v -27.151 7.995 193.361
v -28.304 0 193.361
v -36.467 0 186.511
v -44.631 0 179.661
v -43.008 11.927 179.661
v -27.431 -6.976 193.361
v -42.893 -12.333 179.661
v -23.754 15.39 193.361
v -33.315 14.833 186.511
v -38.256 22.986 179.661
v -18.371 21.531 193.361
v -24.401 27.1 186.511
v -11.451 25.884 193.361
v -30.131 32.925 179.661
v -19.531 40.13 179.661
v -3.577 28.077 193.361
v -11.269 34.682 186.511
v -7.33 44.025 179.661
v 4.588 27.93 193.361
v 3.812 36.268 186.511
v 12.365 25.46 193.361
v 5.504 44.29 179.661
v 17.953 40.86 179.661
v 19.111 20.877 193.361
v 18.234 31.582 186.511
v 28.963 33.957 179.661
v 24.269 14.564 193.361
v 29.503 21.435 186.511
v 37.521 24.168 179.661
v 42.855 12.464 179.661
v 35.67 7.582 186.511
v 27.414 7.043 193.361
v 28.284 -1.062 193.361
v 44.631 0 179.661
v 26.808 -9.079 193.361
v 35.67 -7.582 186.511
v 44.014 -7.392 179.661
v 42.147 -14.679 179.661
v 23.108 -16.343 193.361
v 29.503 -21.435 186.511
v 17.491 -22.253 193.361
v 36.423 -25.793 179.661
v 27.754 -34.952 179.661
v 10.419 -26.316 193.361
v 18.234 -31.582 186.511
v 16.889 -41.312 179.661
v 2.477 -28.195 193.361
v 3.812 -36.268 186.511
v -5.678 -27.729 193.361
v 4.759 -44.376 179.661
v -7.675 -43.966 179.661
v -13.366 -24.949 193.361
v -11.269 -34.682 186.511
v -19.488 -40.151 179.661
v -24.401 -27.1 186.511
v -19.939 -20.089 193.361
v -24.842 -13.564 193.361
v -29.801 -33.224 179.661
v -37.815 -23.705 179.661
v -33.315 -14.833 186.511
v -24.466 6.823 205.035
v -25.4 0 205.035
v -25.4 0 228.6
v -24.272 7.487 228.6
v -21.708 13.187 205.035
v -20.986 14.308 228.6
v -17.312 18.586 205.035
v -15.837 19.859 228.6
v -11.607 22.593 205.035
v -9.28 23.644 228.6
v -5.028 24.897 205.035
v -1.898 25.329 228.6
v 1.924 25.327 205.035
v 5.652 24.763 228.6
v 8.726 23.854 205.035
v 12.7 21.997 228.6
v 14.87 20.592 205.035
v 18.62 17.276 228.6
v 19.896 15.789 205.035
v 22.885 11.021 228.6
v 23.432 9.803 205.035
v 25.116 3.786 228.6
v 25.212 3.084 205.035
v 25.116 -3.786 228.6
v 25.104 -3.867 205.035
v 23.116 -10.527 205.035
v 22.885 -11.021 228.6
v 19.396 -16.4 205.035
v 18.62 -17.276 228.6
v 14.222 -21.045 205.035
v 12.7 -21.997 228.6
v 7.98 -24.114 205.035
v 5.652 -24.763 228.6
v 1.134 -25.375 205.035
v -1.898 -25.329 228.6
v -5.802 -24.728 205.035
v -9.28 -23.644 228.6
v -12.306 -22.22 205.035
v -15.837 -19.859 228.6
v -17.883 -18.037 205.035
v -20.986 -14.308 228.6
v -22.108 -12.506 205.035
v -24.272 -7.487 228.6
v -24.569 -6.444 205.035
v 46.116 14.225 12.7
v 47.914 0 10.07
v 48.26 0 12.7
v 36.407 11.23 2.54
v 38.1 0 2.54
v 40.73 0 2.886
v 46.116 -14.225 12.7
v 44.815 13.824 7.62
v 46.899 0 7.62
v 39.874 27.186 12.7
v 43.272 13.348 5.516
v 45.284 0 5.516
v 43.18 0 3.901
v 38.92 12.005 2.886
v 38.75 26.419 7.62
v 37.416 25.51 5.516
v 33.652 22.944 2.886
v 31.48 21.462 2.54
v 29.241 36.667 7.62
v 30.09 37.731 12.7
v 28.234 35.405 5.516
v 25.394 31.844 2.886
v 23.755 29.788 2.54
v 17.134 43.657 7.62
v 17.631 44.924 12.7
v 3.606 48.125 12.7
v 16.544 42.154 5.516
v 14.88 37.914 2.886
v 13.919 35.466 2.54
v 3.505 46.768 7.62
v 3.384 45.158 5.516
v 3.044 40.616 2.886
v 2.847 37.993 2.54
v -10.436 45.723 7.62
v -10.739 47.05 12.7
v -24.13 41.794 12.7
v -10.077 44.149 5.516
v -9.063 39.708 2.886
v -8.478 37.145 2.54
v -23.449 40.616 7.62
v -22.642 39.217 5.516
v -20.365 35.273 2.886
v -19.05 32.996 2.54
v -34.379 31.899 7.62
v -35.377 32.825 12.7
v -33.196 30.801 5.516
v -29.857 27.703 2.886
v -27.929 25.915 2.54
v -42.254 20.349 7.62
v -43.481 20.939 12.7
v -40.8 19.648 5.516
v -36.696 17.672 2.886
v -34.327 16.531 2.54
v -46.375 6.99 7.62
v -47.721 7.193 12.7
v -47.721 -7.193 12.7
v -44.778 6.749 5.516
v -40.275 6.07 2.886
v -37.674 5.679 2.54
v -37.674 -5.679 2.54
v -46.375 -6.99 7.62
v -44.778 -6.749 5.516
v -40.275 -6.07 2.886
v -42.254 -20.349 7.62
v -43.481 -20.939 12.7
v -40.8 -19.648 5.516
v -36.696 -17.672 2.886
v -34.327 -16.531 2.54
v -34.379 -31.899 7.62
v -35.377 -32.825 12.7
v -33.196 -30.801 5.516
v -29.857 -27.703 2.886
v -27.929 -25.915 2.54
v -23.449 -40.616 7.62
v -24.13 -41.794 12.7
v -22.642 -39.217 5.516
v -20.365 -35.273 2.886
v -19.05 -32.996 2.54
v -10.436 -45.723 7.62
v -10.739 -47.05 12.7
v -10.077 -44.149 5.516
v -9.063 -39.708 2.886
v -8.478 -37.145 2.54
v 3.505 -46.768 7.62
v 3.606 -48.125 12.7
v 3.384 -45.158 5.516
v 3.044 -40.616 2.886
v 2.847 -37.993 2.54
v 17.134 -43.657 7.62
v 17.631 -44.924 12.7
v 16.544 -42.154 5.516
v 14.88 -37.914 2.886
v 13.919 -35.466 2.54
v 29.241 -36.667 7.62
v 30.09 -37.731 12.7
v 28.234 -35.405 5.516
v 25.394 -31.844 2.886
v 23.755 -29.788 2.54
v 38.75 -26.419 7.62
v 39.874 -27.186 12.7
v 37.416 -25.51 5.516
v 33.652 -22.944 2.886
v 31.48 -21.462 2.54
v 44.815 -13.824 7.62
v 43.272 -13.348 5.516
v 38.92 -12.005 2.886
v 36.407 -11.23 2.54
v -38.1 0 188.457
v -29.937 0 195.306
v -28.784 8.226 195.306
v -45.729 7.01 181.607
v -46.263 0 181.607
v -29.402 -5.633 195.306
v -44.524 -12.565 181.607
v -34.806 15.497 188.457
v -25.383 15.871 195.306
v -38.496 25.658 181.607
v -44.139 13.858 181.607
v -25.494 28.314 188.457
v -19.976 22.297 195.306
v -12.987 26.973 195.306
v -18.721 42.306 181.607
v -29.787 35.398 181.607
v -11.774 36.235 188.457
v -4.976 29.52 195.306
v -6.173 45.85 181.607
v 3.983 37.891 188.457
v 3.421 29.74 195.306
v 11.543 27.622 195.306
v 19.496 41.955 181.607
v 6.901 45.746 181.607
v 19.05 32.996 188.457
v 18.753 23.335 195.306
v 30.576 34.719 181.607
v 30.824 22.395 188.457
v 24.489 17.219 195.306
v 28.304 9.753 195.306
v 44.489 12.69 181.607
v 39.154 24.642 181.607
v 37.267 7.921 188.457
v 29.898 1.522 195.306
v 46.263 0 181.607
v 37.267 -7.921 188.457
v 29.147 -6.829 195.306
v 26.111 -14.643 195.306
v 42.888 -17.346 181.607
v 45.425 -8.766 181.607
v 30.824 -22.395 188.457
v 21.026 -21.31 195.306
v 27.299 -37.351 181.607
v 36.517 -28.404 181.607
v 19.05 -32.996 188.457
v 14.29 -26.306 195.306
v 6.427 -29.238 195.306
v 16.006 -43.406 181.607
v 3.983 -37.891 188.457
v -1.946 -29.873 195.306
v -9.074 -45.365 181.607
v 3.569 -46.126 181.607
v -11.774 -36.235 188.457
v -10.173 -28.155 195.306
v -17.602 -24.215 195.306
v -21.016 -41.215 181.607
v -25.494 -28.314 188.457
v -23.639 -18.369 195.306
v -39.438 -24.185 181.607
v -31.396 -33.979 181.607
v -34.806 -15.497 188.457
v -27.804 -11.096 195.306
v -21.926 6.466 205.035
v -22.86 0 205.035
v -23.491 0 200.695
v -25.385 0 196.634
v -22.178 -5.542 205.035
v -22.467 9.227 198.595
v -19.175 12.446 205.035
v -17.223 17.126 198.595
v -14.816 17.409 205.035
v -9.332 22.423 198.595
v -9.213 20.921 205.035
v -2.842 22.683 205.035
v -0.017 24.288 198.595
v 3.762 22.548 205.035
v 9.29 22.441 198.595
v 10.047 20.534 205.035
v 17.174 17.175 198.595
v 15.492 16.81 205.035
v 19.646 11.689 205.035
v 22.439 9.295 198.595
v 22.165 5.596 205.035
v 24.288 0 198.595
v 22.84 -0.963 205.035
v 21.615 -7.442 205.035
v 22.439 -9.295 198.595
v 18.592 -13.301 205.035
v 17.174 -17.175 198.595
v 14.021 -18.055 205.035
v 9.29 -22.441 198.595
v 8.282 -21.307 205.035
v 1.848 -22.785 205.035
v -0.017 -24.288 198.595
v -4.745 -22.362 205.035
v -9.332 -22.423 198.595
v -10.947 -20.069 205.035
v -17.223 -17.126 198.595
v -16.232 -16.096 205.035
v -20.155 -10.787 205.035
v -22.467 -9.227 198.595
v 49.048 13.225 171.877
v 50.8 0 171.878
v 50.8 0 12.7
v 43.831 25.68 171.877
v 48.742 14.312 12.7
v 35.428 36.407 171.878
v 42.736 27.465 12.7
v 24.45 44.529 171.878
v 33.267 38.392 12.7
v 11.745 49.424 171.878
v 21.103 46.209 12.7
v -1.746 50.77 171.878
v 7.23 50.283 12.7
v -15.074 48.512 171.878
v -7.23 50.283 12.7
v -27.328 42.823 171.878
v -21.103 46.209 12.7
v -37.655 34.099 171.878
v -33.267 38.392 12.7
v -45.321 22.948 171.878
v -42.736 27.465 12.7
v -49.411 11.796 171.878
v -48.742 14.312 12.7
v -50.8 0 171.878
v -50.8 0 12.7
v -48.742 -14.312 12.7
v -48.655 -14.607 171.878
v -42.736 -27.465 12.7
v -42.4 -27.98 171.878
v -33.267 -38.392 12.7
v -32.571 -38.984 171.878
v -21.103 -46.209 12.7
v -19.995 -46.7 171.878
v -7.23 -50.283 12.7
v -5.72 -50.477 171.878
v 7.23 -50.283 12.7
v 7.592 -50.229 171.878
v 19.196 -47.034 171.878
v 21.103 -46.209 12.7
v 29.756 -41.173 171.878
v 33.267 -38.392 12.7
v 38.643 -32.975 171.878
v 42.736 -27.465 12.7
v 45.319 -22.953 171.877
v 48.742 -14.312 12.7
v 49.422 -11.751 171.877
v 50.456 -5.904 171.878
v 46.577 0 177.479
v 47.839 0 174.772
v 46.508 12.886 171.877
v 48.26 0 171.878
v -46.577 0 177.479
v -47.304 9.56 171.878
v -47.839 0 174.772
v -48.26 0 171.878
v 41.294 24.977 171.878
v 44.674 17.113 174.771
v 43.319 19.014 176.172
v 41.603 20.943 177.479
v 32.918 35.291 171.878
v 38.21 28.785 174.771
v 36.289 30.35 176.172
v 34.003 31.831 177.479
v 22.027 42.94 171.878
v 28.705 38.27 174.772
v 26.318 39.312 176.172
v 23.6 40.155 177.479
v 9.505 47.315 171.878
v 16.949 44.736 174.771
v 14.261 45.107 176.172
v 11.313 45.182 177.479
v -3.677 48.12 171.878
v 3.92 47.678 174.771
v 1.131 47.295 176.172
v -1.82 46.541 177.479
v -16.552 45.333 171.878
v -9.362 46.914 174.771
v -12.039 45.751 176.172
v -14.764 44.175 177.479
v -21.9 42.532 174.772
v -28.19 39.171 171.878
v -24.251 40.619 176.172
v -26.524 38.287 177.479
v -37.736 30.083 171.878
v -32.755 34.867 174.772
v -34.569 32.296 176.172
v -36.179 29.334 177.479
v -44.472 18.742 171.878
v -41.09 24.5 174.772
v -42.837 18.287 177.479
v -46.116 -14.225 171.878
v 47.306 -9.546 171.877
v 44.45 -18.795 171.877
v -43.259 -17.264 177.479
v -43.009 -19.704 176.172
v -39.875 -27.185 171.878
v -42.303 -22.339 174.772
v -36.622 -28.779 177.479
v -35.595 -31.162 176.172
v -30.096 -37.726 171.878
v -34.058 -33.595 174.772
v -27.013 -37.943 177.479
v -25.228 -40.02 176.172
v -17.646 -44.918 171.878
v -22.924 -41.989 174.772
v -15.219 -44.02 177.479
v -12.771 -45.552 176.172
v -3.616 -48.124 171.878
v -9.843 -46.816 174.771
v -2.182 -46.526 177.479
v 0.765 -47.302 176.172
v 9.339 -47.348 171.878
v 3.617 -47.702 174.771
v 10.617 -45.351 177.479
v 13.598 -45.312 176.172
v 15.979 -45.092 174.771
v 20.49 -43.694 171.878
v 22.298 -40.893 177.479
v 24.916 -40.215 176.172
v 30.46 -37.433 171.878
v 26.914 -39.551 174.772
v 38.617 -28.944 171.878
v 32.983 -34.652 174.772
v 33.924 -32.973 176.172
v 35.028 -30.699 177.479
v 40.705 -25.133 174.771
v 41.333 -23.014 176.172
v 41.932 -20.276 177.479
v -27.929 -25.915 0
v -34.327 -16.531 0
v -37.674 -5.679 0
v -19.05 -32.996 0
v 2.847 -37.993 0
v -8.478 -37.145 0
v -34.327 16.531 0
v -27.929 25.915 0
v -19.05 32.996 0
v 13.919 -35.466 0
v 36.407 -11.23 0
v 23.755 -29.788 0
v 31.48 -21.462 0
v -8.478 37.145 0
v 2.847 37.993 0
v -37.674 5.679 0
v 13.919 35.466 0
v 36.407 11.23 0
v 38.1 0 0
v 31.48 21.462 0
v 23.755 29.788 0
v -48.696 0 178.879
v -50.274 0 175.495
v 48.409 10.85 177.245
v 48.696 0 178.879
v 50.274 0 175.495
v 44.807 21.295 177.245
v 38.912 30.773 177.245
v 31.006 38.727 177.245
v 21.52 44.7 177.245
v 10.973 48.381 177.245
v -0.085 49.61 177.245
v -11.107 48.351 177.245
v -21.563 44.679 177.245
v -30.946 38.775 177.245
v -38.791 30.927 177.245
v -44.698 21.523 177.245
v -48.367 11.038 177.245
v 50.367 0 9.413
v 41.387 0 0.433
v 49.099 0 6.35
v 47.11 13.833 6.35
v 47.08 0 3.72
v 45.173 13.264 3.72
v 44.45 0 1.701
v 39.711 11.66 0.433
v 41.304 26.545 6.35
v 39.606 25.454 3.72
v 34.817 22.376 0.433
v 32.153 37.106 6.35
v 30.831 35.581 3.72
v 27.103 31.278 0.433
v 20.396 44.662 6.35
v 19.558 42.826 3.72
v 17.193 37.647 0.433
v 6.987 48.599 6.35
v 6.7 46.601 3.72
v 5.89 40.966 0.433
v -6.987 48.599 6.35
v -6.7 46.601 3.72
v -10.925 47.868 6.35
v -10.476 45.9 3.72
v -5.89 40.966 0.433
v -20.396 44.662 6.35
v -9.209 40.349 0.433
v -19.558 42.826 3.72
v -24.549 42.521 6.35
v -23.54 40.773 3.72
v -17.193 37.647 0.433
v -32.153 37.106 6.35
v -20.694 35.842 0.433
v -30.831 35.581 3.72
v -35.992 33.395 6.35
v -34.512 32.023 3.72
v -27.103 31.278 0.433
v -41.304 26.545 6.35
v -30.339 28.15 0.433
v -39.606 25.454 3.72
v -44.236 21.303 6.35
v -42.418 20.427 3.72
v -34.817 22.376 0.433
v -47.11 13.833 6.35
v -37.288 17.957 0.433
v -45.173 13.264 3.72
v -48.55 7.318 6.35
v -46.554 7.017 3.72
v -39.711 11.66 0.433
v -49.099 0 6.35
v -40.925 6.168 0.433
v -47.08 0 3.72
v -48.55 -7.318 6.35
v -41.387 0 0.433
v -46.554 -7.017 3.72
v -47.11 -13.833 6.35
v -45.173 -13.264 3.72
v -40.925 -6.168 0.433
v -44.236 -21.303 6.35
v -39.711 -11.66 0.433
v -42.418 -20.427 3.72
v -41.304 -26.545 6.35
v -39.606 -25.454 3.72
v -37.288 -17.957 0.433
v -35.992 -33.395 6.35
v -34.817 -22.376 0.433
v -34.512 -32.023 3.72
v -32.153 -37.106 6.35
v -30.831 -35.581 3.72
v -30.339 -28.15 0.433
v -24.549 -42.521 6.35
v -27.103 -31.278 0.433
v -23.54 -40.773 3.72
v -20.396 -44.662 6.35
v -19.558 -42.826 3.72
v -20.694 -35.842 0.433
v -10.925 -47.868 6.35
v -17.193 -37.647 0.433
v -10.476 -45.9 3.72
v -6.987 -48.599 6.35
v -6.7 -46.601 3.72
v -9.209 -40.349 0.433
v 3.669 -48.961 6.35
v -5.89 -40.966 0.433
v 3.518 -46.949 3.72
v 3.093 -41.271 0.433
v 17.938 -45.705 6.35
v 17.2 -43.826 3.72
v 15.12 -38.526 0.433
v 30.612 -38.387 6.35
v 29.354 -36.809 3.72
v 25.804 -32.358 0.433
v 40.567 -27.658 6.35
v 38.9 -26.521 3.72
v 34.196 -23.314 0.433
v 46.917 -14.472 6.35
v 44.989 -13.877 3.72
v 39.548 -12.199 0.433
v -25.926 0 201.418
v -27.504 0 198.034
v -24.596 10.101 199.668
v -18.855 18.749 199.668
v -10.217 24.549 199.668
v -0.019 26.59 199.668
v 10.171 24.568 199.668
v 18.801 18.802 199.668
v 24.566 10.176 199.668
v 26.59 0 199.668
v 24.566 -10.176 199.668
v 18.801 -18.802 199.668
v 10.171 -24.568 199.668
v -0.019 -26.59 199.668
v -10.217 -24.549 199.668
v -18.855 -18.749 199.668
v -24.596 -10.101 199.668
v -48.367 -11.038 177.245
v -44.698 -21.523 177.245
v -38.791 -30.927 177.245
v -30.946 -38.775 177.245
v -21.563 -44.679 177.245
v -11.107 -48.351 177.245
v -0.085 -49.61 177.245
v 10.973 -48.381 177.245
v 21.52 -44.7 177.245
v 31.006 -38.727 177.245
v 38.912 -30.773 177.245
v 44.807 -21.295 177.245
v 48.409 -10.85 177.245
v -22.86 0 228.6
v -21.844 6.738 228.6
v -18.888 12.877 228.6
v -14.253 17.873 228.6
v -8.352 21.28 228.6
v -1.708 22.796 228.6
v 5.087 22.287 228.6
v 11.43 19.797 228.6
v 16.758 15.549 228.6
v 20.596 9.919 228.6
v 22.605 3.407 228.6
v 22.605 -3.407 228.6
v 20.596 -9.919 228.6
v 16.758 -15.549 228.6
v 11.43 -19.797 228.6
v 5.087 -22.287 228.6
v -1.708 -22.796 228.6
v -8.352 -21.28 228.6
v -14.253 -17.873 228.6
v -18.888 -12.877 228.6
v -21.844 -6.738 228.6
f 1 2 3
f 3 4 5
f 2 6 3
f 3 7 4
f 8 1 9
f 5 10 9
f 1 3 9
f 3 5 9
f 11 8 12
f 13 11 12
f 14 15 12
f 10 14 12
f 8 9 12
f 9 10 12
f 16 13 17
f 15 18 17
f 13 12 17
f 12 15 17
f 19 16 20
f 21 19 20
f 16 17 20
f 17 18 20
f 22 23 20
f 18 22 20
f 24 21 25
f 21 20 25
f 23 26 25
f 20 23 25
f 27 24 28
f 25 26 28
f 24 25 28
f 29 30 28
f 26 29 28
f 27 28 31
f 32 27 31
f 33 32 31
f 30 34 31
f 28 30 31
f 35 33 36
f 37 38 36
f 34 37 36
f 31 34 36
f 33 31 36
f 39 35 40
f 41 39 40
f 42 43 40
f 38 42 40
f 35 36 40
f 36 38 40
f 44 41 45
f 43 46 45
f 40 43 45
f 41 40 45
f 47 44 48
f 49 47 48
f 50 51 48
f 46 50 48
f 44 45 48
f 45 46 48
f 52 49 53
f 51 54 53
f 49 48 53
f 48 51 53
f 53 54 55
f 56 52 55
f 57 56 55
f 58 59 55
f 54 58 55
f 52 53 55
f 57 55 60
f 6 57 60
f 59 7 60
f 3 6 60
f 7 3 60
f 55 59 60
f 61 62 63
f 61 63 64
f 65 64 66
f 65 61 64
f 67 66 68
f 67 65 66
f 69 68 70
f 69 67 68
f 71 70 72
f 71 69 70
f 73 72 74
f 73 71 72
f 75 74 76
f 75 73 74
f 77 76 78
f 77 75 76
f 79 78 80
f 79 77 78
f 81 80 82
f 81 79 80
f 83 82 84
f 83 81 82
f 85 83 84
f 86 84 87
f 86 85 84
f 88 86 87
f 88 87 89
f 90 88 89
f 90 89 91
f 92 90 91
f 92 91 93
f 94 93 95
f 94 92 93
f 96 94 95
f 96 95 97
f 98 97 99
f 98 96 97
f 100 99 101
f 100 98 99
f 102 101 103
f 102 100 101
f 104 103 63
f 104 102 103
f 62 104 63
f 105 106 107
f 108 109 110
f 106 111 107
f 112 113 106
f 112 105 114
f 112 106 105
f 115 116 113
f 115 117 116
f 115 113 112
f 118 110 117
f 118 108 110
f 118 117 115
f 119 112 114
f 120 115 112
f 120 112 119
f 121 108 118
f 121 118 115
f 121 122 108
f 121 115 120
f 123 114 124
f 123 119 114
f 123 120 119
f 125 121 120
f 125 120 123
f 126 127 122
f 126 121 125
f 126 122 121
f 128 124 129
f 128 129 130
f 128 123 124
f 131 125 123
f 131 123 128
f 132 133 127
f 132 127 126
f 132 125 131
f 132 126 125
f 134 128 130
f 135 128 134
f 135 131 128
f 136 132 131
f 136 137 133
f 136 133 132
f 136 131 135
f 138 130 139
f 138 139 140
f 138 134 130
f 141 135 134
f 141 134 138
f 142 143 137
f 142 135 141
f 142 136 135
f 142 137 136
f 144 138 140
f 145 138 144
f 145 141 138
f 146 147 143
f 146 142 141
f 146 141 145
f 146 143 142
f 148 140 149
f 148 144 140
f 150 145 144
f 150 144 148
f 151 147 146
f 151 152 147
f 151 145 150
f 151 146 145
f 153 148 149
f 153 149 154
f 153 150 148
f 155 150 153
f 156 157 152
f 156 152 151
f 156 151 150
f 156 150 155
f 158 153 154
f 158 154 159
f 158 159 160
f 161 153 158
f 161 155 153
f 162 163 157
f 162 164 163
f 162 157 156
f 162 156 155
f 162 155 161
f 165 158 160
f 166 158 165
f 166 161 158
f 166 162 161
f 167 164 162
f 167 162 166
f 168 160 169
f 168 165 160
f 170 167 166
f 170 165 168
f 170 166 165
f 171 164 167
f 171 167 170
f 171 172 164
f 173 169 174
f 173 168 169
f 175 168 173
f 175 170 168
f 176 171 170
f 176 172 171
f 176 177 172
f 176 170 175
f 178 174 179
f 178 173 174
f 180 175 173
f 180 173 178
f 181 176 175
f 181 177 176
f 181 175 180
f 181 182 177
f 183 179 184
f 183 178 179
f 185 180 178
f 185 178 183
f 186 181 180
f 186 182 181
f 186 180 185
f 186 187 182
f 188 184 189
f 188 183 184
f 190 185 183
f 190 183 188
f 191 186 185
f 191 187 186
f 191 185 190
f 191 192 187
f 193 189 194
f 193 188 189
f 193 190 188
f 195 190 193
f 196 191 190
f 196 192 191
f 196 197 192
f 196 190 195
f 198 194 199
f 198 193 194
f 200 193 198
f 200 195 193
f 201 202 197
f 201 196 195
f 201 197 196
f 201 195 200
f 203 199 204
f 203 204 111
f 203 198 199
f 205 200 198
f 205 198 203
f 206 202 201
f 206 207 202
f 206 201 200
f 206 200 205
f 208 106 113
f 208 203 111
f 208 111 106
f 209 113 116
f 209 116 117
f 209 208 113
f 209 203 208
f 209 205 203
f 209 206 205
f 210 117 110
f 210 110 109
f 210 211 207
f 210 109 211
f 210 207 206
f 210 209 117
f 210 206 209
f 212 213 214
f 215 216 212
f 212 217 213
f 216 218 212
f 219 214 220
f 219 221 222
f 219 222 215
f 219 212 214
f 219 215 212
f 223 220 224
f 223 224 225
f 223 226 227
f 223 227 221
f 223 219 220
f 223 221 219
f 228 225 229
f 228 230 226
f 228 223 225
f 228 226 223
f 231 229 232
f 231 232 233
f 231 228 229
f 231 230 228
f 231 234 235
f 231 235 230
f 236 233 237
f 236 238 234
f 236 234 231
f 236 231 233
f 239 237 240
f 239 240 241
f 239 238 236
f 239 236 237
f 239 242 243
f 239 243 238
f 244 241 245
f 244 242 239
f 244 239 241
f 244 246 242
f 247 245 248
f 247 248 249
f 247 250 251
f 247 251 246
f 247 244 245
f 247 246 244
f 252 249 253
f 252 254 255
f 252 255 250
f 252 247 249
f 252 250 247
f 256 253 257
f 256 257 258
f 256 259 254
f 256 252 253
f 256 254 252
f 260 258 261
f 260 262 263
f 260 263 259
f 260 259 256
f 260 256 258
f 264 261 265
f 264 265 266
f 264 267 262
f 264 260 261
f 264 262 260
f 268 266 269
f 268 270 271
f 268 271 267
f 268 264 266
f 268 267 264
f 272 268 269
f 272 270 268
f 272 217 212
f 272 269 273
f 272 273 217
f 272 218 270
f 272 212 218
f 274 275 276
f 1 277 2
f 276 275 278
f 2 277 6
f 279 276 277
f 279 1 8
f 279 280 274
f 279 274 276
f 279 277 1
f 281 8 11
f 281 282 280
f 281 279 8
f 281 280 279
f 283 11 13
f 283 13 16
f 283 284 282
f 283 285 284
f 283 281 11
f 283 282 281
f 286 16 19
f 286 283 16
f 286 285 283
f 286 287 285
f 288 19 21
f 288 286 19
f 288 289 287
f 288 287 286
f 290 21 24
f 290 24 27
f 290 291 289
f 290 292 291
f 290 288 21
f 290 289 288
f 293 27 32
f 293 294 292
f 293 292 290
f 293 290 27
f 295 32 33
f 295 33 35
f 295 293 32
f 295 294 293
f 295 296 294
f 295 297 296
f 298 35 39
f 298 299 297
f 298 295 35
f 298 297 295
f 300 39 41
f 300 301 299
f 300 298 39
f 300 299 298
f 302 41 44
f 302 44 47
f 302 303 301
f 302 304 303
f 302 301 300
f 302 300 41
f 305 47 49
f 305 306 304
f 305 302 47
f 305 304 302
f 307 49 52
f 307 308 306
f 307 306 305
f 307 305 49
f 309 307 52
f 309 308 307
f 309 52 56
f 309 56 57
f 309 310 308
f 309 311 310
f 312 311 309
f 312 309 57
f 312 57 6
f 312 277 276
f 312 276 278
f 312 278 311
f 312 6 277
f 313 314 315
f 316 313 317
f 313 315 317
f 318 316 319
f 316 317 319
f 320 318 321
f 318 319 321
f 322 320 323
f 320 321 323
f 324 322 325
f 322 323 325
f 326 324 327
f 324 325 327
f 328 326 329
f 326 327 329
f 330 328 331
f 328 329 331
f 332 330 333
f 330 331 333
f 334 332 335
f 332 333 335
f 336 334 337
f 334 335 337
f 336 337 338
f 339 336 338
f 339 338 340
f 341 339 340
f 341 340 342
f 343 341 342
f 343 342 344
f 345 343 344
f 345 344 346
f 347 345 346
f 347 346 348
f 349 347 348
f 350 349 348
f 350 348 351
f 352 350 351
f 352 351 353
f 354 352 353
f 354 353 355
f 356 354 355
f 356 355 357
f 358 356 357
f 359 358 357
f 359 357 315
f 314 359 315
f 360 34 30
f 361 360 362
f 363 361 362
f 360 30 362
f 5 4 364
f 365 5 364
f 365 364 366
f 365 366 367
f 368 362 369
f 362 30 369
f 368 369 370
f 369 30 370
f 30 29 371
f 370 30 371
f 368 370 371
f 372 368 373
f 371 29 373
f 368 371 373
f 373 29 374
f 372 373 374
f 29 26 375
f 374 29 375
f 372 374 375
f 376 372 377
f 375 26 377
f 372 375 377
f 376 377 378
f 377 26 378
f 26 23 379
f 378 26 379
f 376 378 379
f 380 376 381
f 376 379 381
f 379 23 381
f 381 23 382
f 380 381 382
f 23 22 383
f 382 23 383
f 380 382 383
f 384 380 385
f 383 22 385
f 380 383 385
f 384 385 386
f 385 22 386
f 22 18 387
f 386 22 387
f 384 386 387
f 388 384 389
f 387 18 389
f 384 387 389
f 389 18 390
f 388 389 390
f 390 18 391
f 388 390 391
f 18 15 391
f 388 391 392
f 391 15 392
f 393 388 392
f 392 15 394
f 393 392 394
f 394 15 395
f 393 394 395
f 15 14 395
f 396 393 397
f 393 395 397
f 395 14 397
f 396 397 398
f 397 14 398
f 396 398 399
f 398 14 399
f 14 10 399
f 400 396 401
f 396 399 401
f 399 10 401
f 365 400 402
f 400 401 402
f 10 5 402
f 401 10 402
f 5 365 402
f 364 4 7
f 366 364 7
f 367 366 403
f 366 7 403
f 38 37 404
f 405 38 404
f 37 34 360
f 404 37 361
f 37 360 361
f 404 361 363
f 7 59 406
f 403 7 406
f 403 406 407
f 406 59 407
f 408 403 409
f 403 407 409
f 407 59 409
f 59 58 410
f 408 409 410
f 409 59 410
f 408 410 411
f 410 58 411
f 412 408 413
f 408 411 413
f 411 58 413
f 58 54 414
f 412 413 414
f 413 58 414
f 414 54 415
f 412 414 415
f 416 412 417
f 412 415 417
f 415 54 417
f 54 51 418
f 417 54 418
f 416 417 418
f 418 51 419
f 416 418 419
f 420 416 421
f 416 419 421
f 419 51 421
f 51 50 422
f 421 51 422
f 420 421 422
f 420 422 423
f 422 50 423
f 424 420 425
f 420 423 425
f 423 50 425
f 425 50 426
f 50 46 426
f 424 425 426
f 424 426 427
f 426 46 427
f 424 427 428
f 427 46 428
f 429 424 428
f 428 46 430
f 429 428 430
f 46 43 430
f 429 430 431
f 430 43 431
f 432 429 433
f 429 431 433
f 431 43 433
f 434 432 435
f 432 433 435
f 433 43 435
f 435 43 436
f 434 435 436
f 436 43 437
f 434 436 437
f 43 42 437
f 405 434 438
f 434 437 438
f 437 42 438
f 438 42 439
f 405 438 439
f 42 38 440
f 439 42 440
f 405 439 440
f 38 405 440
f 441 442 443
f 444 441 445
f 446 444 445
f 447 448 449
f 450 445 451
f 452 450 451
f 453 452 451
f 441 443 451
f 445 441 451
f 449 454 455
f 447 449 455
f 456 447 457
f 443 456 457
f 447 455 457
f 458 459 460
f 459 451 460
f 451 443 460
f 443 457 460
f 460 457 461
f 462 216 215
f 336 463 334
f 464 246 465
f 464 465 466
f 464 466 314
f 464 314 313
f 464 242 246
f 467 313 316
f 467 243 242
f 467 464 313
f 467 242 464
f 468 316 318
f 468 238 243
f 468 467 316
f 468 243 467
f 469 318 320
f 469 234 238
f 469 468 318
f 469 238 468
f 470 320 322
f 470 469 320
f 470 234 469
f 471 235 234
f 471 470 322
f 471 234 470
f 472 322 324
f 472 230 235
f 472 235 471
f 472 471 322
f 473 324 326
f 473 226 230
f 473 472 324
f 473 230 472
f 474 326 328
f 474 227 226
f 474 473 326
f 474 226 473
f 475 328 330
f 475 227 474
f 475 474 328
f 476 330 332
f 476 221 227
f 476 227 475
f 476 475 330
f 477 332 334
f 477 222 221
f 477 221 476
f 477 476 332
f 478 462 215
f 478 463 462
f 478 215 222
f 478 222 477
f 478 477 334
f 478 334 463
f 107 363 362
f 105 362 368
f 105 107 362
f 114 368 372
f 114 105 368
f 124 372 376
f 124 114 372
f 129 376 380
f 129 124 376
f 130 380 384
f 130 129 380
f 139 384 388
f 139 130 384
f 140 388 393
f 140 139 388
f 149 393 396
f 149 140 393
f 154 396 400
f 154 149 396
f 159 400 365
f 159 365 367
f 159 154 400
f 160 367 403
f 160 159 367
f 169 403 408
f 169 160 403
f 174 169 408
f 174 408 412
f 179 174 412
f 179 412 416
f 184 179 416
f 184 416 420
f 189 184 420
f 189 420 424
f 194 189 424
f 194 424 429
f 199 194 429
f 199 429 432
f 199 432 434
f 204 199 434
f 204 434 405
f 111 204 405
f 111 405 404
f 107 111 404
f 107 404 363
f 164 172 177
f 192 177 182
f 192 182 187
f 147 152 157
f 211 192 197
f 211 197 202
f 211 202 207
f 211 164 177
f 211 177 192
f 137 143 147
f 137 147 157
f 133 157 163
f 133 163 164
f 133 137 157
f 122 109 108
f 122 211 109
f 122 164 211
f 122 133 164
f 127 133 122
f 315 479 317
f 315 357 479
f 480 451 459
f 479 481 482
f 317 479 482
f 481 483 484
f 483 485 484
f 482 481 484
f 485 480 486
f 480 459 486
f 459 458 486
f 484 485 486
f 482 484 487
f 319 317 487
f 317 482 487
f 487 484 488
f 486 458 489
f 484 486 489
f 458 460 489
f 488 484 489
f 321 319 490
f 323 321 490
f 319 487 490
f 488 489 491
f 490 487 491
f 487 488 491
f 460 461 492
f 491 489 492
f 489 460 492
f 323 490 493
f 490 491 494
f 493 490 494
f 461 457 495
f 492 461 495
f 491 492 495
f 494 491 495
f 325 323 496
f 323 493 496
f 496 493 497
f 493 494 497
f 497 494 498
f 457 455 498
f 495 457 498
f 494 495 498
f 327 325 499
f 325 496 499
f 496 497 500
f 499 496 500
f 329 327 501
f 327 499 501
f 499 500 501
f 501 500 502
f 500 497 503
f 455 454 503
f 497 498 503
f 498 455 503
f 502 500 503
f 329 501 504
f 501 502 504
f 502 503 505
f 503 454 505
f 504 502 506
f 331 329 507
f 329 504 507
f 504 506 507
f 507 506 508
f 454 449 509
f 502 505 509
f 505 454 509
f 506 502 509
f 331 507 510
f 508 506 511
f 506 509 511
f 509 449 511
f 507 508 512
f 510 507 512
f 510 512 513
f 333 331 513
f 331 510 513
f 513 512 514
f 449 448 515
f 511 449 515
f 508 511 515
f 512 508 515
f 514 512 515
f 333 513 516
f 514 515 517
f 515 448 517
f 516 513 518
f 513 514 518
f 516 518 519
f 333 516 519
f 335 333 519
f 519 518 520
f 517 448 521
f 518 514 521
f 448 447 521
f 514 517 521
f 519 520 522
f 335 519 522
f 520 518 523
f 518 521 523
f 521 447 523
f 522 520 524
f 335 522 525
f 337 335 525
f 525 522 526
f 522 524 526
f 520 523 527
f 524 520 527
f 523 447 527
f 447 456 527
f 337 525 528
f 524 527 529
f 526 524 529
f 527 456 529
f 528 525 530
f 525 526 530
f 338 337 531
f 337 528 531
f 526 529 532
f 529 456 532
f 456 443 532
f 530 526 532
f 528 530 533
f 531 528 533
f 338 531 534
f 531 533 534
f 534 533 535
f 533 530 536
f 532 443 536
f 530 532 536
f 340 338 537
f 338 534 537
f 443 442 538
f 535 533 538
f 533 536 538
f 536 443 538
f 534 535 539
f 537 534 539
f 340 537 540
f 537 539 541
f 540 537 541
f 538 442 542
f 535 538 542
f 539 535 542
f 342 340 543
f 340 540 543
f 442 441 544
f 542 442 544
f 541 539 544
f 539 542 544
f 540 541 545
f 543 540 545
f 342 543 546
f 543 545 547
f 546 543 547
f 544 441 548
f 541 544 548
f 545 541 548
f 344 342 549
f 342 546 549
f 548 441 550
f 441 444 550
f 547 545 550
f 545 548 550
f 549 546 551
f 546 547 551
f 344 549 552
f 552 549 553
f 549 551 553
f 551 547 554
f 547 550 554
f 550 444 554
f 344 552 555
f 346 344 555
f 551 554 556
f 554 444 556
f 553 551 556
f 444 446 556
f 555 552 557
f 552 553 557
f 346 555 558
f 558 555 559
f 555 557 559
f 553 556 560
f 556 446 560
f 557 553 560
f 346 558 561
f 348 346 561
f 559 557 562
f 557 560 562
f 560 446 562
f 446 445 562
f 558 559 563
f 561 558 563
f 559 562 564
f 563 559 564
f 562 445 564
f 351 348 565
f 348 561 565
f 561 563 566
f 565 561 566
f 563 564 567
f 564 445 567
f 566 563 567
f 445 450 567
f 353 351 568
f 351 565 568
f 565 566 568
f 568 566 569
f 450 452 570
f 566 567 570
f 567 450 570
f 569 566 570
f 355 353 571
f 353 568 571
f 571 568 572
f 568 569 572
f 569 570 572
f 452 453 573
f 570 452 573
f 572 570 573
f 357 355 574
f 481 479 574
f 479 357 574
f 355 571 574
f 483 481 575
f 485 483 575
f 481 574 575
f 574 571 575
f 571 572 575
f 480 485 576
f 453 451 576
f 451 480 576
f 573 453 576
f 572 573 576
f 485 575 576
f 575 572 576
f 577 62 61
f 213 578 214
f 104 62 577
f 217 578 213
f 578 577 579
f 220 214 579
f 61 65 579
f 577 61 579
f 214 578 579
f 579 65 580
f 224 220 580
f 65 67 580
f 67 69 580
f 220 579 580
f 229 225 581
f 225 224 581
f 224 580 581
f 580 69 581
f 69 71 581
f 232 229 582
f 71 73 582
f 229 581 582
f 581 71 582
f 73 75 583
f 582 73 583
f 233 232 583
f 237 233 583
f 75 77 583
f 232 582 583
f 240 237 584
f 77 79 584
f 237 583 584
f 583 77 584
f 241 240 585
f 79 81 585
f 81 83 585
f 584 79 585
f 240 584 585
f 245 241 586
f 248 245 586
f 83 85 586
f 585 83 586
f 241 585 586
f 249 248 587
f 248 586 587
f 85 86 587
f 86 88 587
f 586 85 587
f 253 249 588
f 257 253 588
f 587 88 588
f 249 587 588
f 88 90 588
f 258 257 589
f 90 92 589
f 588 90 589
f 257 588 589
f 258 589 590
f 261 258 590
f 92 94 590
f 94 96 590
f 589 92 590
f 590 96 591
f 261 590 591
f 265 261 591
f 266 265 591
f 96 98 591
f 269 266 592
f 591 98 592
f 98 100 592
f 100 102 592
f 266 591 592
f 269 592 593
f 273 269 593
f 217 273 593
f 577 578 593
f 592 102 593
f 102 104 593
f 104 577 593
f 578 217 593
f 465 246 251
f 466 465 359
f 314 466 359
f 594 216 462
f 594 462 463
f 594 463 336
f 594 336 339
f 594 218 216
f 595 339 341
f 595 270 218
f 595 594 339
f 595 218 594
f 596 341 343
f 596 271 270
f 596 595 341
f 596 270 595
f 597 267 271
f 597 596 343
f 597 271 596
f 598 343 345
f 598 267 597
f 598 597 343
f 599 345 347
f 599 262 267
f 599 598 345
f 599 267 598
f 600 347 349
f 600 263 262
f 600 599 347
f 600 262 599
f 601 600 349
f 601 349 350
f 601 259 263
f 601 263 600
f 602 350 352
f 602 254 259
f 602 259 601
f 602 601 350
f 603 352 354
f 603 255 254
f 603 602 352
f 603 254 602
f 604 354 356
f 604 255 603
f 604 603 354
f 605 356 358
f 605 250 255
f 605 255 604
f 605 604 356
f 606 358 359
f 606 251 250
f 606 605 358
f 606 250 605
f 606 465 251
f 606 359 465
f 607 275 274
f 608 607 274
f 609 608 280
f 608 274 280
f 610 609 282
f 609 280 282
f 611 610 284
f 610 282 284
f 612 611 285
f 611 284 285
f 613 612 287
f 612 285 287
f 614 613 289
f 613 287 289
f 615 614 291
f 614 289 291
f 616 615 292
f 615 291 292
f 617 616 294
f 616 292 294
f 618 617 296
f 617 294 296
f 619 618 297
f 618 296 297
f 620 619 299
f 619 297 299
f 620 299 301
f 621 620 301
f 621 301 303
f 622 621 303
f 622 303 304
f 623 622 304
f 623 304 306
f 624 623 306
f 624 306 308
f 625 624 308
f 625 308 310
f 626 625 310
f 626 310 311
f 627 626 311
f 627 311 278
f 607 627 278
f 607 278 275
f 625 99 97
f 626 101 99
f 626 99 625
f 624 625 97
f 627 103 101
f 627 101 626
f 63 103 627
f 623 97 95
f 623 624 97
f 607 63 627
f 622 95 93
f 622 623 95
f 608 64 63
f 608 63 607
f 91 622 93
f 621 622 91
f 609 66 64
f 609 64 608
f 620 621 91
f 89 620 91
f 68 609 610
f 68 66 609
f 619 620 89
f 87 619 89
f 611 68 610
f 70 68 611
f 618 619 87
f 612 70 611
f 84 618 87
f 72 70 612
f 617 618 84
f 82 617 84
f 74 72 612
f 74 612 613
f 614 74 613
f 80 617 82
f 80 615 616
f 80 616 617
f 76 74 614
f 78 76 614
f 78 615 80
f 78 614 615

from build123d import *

# Parameters (mm, degrees)
F0_R     = 50.8
F1_DEPTH = 177.8
F4_R     = 12.7
F5_T     = -2.54


with BuildPart() as f1:
    # F0 (on Top) → F1 (new body)
    with BuildSketch(Plane.XY):
        Circle(F0_R)
    extrude(amount=F1_DEPTH)

    # F2 (on Front) → F3 (revolve)
    with BuildSketch(Plane.XZ):
        Polygon((-50.8, 177.8), (0, 177.8), (0, 228.6), (-25.4, 228.6), (-25.4, 199.113131), align=None)
    revolve(axis=Axis((0, 0, 203.2), (0, 0, -1)))

    # F4
    f4_edges = [f1.edges().sort_by_distance(p)[0] for p in [
        (-50.8, 0, 0),
        (0, -50.8, 177.8),
        (0, 50.8, 177.8),
        (25.4, 0, 199.113131),
    ]]
    fillet(f4_edges, radius=F4_R)

    # F5
    f5_openings = [f1.faces().sort_by_distance(p)[0] for p in [
        (0, 0, 228.6),
    ]]
    offset(amount=F5_T, openings=f5_openings)


solid = f1.part
